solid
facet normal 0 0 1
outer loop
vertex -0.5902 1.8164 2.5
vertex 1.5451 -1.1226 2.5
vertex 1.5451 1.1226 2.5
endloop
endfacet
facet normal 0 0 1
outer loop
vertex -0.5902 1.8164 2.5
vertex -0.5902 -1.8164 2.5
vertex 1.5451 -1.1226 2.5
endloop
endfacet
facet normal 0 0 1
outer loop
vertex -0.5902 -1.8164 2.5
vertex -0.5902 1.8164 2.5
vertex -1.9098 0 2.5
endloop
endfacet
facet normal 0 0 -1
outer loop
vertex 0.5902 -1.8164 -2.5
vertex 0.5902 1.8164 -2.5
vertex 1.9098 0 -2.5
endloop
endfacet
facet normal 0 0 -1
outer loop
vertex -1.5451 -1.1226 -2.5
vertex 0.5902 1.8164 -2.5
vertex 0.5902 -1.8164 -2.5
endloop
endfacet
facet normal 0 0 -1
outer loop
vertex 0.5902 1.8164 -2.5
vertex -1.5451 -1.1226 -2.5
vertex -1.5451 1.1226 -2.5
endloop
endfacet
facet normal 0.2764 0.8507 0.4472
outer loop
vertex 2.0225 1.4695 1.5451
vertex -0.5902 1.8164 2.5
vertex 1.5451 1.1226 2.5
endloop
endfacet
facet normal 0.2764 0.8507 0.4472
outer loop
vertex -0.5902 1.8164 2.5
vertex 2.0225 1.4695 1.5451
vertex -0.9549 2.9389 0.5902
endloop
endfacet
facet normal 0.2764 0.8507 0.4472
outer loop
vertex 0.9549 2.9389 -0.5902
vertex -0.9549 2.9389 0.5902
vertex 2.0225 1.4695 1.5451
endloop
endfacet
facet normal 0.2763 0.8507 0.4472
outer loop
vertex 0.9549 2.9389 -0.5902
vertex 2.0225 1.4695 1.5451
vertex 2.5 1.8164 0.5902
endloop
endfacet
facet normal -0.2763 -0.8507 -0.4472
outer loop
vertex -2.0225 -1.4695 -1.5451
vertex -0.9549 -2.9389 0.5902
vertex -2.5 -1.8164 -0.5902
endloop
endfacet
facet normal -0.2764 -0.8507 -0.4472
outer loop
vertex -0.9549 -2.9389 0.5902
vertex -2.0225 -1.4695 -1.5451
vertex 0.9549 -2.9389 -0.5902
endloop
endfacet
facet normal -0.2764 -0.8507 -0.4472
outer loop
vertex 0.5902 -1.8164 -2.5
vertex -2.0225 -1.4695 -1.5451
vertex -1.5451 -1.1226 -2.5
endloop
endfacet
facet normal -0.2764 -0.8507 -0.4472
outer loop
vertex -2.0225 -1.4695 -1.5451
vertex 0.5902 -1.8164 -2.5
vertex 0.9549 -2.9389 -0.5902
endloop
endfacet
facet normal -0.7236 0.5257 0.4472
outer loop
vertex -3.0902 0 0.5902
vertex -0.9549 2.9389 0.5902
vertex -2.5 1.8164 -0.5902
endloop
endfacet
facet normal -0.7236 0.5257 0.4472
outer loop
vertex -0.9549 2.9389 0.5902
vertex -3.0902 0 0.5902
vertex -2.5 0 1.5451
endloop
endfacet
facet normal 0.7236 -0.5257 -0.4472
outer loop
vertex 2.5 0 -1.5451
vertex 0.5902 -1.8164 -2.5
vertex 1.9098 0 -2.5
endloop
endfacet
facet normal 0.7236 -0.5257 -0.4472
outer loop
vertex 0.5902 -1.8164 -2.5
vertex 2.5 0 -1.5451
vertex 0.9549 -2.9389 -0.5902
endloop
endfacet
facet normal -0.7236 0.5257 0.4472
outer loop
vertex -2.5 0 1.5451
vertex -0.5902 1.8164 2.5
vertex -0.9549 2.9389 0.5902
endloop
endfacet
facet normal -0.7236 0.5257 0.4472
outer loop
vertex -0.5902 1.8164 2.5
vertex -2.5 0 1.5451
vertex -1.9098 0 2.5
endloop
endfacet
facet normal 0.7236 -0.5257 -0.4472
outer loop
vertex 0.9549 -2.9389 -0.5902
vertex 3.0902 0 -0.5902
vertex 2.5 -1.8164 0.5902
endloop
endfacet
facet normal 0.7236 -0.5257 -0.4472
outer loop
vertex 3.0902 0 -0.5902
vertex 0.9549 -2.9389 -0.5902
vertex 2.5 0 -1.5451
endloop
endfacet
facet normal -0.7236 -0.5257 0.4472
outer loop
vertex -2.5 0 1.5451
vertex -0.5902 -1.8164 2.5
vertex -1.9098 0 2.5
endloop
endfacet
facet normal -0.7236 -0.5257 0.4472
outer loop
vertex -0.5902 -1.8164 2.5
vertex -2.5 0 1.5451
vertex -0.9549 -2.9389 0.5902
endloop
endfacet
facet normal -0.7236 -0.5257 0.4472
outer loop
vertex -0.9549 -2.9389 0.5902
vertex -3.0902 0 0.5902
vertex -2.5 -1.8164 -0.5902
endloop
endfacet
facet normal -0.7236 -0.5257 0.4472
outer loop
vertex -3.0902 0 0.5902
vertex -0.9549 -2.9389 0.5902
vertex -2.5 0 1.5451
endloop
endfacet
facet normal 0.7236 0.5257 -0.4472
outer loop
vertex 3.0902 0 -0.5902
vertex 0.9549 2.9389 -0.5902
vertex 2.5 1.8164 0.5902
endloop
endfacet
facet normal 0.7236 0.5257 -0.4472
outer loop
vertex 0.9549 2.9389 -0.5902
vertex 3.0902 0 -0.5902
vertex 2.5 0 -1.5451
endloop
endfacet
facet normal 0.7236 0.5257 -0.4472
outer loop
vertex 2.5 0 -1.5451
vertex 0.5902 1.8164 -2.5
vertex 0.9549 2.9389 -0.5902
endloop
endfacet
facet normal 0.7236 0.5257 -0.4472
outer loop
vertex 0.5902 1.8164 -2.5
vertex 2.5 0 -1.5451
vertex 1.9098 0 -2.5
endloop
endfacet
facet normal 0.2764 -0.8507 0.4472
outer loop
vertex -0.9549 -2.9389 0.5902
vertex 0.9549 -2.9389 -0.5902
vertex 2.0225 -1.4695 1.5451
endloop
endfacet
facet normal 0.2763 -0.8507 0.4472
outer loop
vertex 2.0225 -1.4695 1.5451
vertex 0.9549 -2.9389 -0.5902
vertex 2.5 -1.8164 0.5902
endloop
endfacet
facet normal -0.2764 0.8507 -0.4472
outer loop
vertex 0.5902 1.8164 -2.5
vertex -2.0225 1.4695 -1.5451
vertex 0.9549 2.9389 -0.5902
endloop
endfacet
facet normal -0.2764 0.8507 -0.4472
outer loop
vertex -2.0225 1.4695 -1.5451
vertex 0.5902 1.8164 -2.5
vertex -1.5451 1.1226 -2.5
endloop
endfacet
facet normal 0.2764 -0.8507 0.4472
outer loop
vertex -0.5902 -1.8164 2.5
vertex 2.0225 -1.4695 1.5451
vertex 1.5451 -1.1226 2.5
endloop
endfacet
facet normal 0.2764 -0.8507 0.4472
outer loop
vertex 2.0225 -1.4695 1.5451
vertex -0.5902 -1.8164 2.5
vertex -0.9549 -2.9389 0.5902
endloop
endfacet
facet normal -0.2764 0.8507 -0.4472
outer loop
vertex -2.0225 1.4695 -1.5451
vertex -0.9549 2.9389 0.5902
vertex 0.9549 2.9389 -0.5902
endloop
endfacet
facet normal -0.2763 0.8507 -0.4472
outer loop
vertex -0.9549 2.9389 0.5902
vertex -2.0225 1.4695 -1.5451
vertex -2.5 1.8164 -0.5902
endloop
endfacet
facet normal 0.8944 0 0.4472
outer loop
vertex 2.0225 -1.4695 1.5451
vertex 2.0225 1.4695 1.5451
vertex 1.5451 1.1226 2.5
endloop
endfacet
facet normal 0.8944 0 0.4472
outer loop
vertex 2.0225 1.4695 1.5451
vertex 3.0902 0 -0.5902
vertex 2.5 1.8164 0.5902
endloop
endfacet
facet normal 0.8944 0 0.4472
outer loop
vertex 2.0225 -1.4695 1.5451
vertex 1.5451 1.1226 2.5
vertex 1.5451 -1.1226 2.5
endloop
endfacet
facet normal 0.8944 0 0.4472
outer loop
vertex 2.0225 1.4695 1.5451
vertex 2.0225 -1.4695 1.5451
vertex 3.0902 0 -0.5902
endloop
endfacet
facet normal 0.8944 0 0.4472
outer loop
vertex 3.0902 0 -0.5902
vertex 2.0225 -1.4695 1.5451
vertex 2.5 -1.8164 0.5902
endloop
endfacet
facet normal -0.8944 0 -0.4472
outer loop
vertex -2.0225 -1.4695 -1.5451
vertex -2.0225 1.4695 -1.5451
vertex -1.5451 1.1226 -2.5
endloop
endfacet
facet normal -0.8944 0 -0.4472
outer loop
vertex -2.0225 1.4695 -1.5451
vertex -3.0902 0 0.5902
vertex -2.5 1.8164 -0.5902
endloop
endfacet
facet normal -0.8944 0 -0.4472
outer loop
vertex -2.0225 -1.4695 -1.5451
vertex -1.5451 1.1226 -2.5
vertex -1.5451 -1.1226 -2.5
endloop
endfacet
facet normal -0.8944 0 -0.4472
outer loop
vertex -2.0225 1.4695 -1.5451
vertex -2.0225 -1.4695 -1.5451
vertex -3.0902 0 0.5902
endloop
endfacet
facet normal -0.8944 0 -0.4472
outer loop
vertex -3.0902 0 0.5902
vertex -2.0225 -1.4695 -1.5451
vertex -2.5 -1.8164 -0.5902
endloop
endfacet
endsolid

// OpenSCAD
size = 5;

module tetrahedron(c) {
    color(c, 1.0)
    cylinder(r1 = size / sqrt(2), r2 = 0, h = size, center = true, $fn = 3);
}

// Octahedron
//hull() {
//    tetrahedron(c="red");
//
//    mirror([0, 0, 1])
//    mirror([1, 0, 0])
//    tetrahedron(c="blue");
//}

// Dodecahedron
intersection() {
    cylinder(r = size, h = size, center = true, $fn = 10);
    rotate([0, atan(2), 72])
    cylinder(r = size, h = size, center = true, $fn = 10);
    rotate([0, atan(2), 144])
    cylinder(r = size, h = size, center = true, $fn = 10);
    rotate([0, atan(2), 216])
    cylinder(r = size, h = size, center = true, $fn = 10);
    rotate([0, atan(2), 288])
    cylinder(r = size, h = size, center = true, $fn = 10);
    rotate([0, atan(2), 360])
    cylinder(r = size, h = size, center = true, $fn = 10);
}
